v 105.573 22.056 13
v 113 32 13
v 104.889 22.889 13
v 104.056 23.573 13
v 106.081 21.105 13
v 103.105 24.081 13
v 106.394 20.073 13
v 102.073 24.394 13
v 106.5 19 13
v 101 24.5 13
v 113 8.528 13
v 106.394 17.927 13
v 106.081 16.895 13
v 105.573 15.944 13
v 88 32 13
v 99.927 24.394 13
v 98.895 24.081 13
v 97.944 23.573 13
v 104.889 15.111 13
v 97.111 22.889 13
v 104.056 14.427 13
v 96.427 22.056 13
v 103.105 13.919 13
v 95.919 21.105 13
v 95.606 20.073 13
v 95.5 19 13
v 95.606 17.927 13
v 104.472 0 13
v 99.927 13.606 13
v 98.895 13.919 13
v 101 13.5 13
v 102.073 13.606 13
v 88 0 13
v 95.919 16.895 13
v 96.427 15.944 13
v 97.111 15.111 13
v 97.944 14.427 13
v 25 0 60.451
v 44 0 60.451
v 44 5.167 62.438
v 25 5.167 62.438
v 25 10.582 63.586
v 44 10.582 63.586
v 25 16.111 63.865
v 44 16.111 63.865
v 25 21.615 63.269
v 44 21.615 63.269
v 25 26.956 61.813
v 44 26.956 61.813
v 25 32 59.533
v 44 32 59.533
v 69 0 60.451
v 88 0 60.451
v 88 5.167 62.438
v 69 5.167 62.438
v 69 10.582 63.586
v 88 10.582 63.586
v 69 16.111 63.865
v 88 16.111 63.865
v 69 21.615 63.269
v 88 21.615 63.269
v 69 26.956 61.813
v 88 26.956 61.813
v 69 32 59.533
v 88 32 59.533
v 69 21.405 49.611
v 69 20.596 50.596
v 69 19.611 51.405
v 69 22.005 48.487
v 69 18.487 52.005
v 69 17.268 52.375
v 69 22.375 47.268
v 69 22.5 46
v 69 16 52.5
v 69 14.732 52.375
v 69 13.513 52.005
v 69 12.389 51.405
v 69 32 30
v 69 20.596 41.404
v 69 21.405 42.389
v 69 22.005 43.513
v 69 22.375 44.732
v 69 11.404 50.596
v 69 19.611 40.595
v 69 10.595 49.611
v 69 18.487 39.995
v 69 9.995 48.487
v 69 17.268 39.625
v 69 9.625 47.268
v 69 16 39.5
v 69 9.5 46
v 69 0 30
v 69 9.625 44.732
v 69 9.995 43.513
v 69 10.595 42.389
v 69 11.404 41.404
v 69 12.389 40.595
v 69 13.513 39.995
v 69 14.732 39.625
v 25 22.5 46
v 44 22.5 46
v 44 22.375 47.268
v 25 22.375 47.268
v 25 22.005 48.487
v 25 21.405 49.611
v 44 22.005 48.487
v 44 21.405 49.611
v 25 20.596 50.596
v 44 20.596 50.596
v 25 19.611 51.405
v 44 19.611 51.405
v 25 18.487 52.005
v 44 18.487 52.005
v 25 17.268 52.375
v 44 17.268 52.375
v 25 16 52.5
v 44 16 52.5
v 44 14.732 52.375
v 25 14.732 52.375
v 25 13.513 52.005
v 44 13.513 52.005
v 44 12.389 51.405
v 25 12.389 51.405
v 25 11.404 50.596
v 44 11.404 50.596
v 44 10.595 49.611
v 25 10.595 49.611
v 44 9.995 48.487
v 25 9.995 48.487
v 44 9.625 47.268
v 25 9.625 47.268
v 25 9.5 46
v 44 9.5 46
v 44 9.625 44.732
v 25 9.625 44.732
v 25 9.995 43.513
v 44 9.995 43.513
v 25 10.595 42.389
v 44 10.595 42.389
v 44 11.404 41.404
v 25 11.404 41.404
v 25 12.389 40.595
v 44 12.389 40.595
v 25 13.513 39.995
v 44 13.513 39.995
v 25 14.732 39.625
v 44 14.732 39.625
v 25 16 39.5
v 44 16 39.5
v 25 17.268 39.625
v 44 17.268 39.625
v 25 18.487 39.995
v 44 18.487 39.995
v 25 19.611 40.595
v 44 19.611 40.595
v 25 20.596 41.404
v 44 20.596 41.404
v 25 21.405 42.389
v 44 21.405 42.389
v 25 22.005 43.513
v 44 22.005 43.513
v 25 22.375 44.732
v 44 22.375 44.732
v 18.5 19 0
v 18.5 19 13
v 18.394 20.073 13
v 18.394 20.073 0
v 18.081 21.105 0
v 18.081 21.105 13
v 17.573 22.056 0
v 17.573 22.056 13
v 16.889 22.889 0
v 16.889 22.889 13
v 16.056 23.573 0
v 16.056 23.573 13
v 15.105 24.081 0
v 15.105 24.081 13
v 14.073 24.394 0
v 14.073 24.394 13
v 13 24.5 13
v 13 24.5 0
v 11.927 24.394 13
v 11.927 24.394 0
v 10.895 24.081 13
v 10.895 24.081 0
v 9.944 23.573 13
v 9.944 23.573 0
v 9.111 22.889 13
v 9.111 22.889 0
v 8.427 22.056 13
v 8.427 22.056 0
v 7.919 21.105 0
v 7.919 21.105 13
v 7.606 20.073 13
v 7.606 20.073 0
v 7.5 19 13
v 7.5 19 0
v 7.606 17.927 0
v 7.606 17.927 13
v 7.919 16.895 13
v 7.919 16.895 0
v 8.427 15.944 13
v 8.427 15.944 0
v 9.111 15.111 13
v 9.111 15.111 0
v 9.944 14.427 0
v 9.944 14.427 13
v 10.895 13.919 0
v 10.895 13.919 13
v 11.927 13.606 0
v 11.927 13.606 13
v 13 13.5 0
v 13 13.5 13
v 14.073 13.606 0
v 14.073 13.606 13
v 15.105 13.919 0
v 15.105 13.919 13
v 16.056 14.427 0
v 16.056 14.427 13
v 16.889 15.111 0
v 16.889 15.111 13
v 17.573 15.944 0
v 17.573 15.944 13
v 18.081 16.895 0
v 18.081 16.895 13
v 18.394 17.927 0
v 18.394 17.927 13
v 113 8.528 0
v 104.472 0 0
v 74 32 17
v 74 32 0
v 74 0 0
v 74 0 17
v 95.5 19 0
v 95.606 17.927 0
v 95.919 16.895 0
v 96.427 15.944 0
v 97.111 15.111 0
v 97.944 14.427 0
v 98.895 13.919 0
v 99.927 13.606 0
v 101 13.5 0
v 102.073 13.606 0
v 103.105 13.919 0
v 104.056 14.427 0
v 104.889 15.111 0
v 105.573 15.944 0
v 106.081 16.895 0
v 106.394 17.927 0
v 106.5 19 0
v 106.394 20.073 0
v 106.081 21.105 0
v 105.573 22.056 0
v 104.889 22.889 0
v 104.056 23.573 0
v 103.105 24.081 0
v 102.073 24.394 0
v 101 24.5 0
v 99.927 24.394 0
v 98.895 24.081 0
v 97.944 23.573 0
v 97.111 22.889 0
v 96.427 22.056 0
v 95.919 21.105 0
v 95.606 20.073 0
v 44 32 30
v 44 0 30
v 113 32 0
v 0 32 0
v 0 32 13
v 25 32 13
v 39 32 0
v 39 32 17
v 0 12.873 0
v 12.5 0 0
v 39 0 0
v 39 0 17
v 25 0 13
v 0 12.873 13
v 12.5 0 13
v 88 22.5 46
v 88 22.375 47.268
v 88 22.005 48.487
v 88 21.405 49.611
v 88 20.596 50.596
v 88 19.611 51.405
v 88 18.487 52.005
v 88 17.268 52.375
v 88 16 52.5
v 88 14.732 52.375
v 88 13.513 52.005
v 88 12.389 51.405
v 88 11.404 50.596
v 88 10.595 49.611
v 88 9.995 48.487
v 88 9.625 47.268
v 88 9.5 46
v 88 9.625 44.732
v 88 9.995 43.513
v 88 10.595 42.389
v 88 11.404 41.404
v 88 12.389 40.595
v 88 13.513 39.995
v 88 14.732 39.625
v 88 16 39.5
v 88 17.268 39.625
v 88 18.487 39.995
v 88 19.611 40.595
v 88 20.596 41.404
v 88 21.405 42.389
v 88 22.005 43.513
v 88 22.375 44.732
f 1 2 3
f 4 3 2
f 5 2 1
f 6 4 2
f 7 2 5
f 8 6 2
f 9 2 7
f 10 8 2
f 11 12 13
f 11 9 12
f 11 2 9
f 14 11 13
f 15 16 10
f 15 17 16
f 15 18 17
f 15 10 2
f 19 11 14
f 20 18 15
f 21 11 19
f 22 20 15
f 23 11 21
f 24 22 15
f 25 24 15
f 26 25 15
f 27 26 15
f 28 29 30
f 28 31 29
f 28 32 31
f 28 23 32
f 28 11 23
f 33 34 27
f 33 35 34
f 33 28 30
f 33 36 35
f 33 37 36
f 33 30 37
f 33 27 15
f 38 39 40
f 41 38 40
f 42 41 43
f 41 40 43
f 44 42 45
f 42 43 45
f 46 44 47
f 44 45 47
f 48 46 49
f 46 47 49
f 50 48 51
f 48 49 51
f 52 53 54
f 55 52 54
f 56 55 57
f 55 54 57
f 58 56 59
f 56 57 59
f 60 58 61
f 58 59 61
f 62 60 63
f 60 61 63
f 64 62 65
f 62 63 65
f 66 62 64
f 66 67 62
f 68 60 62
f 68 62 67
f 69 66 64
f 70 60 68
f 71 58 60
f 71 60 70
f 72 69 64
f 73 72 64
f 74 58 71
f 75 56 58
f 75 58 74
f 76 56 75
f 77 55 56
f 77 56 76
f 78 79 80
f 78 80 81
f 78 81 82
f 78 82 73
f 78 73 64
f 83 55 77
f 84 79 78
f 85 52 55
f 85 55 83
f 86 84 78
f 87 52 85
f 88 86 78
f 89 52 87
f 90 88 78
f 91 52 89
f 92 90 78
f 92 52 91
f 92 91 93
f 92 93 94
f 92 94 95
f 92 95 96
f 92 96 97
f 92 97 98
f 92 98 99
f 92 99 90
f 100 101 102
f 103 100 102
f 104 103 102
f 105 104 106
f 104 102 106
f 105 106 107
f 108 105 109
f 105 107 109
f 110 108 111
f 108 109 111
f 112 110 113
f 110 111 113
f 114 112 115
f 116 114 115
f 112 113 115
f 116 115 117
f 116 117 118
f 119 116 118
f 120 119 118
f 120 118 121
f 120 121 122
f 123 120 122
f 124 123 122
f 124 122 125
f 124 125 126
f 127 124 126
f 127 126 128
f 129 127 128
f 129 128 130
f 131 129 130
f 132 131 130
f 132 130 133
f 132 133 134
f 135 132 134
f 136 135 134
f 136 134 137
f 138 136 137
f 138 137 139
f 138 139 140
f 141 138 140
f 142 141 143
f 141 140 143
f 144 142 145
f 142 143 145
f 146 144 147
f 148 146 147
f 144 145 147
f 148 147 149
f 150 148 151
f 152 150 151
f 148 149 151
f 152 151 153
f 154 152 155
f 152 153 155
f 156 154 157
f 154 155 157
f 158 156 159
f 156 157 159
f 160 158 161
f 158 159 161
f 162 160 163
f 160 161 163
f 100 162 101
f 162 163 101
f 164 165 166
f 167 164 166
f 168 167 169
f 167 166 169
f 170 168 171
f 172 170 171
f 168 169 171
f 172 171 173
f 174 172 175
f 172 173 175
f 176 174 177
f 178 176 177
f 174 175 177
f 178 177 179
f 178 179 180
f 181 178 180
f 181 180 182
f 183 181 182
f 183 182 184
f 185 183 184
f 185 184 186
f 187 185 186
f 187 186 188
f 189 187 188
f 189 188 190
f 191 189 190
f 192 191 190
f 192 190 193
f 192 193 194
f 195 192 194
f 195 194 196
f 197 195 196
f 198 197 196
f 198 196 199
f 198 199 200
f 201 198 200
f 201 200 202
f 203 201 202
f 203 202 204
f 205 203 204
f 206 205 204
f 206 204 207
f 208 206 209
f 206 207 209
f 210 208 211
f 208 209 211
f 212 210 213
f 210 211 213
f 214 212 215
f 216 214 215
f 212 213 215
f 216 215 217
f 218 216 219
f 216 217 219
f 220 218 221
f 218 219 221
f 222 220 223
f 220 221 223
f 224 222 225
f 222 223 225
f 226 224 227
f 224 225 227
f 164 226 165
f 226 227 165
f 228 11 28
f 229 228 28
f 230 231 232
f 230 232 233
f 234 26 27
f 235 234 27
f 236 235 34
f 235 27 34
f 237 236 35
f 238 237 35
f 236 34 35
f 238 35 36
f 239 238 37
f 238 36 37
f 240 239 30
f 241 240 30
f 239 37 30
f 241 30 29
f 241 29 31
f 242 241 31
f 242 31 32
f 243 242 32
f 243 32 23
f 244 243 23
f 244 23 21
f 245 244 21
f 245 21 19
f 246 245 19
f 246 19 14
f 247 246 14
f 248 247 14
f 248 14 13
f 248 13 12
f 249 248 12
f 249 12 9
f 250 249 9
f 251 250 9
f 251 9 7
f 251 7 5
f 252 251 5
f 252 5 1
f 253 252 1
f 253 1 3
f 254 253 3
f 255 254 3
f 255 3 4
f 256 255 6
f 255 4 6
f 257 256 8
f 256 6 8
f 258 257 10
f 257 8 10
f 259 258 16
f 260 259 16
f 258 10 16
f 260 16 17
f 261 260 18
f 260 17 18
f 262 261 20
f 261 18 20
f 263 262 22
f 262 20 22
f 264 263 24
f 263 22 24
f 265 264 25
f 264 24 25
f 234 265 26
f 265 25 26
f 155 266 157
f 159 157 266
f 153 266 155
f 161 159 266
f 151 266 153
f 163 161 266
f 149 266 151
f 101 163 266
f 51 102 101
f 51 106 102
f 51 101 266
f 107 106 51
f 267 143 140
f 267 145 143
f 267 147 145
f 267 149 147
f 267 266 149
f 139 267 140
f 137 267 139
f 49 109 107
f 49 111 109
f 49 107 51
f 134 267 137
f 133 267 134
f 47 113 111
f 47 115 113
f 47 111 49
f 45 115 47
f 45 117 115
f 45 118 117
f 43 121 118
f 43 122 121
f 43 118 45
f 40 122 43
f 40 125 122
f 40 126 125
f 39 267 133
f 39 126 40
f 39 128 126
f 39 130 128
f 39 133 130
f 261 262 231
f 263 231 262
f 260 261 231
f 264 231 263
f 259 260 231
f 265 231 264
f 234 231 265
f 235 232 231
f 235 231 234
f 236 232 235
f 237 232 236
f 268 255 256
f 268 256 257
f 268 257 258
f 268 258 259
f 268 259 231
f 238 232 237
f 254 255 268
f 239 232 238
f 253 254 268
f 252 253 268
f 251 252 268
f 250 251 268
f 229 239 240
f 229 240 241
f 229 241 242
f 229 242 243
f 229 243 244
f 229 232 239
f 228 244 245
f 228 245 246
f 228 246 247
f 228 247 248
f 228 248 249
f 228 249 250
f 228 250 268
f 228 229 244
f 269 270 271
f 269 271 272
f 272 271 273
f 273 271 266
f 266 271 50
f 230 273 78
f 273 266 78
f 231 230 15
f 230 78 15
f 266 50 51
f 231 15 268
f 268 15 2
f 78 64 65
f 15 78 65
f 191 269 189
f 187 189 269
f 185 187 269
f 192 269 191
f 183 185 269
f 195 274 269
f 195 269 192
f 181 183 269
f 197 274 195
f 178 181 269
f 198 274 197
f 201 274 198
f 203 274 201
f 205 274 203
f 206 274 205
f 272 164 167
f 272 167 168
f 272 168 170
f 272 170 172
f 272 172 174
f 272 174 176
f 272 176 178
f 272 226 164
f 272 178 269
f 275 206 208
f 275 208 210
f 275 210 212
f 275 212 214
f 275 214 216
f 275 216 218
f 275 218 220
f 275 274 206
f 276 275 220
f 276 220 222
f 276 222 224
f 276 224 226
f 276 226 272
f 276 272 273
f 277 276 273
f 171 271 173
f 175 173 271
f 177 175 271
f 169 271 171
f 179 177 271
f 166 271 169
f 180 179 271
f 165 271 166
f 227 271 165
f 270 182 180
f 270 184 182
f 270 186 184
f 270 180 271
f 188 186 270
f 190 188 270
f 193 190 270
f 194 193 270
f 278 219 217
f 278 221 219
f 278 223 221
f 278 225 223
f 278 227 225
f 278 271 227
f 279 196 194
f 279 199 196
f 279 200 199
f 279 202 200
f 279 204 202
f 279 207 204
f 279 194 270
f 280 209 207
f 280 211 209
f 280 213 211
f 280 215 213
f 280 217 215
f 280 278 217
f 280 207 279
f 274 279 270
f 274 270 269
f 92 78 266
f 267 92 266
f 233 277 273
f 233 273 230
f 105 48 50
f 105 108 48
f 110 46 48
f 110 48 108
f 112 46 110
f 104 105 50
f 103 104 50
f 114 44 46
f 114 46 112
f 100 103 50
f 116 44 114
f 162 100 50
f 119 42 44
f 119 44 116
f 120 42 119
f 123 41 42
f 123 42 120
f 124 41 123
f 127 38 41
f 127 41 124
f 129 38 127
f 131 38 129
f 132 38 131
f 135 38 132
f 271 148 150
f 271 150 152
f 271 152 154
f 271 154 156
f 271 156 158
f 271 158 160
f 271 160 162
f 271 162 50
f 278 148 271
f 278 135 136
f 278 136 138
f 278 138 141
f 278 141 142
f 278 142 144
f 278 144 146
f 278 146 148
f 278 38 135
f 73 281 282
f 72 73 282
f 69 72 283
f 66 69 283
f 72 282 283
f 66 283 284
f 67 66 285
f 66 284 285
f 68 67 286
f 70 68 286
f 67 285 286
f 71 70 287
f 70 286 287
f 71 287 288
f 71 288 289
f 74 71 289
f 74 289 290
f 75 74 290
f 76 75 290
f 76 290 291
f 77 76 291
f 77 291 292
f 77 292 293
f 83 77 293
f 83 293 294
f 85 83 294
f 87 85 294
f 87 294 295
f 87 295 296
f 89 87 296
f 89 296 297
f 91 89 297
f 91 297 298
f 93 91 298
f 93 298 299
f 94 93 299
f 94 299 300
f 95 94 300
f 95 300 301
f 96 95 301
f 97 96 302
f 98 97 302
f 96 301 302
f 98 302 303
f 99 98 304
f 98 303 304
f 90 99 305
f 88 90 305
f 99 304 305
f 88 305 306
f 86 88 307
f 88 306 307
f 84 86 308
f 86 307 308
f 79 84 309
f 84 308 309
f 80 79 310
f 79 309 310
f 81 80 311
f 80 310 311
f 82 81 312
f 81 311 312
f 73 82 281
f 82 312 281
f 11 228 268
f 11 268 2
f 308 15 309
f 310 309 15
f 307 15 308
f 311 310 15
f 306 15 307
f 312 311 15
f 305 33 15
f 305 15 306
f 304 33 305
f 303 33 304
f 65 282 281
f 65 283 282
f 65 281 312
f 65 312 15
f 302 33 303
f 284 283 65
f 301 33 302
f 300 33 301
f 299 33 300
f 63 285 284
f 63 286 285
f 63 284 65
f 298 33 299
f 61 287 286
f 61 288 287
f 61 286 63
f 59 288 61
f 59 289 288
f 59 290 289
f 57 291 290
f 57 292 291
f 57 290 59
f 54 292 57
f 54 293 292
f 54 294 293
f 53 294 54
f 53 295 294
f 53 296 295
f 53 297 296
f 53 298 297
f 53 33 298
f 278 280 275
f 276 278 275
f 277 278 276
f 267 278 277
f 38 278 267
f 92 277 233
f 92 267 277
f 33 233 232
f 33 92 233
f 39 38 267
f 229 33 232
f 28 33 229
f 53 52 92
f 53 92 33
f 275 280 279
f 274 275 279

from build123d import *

# Parameters (mm, degrees)
F1_DEPTH  = 32
F2_W      = 35
F2_H      = 17
F4_DEPTH  = 32
F5_DEPTH  = 25
F6_R      = 6.5
F7_DEPTH  = 80
F9_DEPTH  = 80
F11_DEPTH = 25
F13_DEPTH = 25


with BuildPart() as f1:
    # F0 (on Front) → F1 (new body)
    with BuildSketch(Plane.XZ):
        Polygon((0, 0), (39, 0), (74, 0), (113, 0), (113, 13), (88, 13), (88, 64), (69, 64), (69, 30), (44, 30), (44, 64), (25, 64), (25, 13), (0, 13), align=None)
    extrude(amount=-F1_DEPTH)

    # F2 (on face) → F4 (cut)
    with BuildSketch(Plane.XZ):
        with Locations((56.5, 8.5)):
            Rectangle(F2_W, F2_H)
    extrude(amount=-F4_DEPTH, mode=Mode.SUBTRACT)

    # F3 (on face) → F5 (cut)
    with BuildSketch(Plane.XY.offset(13)):
        with BuildLine():
            ThreePointArc((106.5, 19), (101, 24.5), (95.5, 19))
            ThreePointArc((95.5, 19), (101, 13.5), (106.5, 19))
        make_face()
        with BuildLine():
            ThreePointArc((7.5, 19), (13, 13.5), (18.5, 19))
            ThreePointArc((18.5, 19), (13, 24.5), (7.5, 19))
        make_face()
    extrude(amount=-F5_DEPTH, mode=Mode.SUBTRACT)

    # F6 (on face) → F7 (cut)
    with BuildSketch(Plane.YZ.offset(88)):
        with Locations((16, 46)):
            Circle(F6_R)
    extrude(amount=-F7_DEPTH, mode=Mode.SUBTRACT)

    # F8 (on face) → F9 (cut)
    with BuildSketch(Plane.YZ.offset(88)):
        with BuildLine():
            ThreePointArc((0, 60.4506665125), (16.1110103603, 63.8650900471), (32, 59.5334678182))
            Line((32, 59.5334678182), (32, 64))
            Line((32, 64), (0, 64))
            Line((0, 64), (0, 60.4506665125))
        make_face()
    extrude(amount=-F9_DEPTH, mode=Mode.SUBTRACT)

    # F10 (on face) → F11 (cut)
    with BuildSketch(Plane.XY.offset(13)):
        Polygon((104.471758008, 0), (113, 0), (113, 8.528241992), align=None)
    extrude(amount=-F11_DEPTH, mode=Mode.SUBTRACT)

    # F12 (on face) → F13 (cut)
    with BuildSketch(Plane.XY.offset(13)):
        Polygon((0, 12.873), (0, 0), (12.5, 0), align=None)
    extrude(amount=-F13_DEPTH, mode=Mode.SUBTRACT)


solid = f1.part
